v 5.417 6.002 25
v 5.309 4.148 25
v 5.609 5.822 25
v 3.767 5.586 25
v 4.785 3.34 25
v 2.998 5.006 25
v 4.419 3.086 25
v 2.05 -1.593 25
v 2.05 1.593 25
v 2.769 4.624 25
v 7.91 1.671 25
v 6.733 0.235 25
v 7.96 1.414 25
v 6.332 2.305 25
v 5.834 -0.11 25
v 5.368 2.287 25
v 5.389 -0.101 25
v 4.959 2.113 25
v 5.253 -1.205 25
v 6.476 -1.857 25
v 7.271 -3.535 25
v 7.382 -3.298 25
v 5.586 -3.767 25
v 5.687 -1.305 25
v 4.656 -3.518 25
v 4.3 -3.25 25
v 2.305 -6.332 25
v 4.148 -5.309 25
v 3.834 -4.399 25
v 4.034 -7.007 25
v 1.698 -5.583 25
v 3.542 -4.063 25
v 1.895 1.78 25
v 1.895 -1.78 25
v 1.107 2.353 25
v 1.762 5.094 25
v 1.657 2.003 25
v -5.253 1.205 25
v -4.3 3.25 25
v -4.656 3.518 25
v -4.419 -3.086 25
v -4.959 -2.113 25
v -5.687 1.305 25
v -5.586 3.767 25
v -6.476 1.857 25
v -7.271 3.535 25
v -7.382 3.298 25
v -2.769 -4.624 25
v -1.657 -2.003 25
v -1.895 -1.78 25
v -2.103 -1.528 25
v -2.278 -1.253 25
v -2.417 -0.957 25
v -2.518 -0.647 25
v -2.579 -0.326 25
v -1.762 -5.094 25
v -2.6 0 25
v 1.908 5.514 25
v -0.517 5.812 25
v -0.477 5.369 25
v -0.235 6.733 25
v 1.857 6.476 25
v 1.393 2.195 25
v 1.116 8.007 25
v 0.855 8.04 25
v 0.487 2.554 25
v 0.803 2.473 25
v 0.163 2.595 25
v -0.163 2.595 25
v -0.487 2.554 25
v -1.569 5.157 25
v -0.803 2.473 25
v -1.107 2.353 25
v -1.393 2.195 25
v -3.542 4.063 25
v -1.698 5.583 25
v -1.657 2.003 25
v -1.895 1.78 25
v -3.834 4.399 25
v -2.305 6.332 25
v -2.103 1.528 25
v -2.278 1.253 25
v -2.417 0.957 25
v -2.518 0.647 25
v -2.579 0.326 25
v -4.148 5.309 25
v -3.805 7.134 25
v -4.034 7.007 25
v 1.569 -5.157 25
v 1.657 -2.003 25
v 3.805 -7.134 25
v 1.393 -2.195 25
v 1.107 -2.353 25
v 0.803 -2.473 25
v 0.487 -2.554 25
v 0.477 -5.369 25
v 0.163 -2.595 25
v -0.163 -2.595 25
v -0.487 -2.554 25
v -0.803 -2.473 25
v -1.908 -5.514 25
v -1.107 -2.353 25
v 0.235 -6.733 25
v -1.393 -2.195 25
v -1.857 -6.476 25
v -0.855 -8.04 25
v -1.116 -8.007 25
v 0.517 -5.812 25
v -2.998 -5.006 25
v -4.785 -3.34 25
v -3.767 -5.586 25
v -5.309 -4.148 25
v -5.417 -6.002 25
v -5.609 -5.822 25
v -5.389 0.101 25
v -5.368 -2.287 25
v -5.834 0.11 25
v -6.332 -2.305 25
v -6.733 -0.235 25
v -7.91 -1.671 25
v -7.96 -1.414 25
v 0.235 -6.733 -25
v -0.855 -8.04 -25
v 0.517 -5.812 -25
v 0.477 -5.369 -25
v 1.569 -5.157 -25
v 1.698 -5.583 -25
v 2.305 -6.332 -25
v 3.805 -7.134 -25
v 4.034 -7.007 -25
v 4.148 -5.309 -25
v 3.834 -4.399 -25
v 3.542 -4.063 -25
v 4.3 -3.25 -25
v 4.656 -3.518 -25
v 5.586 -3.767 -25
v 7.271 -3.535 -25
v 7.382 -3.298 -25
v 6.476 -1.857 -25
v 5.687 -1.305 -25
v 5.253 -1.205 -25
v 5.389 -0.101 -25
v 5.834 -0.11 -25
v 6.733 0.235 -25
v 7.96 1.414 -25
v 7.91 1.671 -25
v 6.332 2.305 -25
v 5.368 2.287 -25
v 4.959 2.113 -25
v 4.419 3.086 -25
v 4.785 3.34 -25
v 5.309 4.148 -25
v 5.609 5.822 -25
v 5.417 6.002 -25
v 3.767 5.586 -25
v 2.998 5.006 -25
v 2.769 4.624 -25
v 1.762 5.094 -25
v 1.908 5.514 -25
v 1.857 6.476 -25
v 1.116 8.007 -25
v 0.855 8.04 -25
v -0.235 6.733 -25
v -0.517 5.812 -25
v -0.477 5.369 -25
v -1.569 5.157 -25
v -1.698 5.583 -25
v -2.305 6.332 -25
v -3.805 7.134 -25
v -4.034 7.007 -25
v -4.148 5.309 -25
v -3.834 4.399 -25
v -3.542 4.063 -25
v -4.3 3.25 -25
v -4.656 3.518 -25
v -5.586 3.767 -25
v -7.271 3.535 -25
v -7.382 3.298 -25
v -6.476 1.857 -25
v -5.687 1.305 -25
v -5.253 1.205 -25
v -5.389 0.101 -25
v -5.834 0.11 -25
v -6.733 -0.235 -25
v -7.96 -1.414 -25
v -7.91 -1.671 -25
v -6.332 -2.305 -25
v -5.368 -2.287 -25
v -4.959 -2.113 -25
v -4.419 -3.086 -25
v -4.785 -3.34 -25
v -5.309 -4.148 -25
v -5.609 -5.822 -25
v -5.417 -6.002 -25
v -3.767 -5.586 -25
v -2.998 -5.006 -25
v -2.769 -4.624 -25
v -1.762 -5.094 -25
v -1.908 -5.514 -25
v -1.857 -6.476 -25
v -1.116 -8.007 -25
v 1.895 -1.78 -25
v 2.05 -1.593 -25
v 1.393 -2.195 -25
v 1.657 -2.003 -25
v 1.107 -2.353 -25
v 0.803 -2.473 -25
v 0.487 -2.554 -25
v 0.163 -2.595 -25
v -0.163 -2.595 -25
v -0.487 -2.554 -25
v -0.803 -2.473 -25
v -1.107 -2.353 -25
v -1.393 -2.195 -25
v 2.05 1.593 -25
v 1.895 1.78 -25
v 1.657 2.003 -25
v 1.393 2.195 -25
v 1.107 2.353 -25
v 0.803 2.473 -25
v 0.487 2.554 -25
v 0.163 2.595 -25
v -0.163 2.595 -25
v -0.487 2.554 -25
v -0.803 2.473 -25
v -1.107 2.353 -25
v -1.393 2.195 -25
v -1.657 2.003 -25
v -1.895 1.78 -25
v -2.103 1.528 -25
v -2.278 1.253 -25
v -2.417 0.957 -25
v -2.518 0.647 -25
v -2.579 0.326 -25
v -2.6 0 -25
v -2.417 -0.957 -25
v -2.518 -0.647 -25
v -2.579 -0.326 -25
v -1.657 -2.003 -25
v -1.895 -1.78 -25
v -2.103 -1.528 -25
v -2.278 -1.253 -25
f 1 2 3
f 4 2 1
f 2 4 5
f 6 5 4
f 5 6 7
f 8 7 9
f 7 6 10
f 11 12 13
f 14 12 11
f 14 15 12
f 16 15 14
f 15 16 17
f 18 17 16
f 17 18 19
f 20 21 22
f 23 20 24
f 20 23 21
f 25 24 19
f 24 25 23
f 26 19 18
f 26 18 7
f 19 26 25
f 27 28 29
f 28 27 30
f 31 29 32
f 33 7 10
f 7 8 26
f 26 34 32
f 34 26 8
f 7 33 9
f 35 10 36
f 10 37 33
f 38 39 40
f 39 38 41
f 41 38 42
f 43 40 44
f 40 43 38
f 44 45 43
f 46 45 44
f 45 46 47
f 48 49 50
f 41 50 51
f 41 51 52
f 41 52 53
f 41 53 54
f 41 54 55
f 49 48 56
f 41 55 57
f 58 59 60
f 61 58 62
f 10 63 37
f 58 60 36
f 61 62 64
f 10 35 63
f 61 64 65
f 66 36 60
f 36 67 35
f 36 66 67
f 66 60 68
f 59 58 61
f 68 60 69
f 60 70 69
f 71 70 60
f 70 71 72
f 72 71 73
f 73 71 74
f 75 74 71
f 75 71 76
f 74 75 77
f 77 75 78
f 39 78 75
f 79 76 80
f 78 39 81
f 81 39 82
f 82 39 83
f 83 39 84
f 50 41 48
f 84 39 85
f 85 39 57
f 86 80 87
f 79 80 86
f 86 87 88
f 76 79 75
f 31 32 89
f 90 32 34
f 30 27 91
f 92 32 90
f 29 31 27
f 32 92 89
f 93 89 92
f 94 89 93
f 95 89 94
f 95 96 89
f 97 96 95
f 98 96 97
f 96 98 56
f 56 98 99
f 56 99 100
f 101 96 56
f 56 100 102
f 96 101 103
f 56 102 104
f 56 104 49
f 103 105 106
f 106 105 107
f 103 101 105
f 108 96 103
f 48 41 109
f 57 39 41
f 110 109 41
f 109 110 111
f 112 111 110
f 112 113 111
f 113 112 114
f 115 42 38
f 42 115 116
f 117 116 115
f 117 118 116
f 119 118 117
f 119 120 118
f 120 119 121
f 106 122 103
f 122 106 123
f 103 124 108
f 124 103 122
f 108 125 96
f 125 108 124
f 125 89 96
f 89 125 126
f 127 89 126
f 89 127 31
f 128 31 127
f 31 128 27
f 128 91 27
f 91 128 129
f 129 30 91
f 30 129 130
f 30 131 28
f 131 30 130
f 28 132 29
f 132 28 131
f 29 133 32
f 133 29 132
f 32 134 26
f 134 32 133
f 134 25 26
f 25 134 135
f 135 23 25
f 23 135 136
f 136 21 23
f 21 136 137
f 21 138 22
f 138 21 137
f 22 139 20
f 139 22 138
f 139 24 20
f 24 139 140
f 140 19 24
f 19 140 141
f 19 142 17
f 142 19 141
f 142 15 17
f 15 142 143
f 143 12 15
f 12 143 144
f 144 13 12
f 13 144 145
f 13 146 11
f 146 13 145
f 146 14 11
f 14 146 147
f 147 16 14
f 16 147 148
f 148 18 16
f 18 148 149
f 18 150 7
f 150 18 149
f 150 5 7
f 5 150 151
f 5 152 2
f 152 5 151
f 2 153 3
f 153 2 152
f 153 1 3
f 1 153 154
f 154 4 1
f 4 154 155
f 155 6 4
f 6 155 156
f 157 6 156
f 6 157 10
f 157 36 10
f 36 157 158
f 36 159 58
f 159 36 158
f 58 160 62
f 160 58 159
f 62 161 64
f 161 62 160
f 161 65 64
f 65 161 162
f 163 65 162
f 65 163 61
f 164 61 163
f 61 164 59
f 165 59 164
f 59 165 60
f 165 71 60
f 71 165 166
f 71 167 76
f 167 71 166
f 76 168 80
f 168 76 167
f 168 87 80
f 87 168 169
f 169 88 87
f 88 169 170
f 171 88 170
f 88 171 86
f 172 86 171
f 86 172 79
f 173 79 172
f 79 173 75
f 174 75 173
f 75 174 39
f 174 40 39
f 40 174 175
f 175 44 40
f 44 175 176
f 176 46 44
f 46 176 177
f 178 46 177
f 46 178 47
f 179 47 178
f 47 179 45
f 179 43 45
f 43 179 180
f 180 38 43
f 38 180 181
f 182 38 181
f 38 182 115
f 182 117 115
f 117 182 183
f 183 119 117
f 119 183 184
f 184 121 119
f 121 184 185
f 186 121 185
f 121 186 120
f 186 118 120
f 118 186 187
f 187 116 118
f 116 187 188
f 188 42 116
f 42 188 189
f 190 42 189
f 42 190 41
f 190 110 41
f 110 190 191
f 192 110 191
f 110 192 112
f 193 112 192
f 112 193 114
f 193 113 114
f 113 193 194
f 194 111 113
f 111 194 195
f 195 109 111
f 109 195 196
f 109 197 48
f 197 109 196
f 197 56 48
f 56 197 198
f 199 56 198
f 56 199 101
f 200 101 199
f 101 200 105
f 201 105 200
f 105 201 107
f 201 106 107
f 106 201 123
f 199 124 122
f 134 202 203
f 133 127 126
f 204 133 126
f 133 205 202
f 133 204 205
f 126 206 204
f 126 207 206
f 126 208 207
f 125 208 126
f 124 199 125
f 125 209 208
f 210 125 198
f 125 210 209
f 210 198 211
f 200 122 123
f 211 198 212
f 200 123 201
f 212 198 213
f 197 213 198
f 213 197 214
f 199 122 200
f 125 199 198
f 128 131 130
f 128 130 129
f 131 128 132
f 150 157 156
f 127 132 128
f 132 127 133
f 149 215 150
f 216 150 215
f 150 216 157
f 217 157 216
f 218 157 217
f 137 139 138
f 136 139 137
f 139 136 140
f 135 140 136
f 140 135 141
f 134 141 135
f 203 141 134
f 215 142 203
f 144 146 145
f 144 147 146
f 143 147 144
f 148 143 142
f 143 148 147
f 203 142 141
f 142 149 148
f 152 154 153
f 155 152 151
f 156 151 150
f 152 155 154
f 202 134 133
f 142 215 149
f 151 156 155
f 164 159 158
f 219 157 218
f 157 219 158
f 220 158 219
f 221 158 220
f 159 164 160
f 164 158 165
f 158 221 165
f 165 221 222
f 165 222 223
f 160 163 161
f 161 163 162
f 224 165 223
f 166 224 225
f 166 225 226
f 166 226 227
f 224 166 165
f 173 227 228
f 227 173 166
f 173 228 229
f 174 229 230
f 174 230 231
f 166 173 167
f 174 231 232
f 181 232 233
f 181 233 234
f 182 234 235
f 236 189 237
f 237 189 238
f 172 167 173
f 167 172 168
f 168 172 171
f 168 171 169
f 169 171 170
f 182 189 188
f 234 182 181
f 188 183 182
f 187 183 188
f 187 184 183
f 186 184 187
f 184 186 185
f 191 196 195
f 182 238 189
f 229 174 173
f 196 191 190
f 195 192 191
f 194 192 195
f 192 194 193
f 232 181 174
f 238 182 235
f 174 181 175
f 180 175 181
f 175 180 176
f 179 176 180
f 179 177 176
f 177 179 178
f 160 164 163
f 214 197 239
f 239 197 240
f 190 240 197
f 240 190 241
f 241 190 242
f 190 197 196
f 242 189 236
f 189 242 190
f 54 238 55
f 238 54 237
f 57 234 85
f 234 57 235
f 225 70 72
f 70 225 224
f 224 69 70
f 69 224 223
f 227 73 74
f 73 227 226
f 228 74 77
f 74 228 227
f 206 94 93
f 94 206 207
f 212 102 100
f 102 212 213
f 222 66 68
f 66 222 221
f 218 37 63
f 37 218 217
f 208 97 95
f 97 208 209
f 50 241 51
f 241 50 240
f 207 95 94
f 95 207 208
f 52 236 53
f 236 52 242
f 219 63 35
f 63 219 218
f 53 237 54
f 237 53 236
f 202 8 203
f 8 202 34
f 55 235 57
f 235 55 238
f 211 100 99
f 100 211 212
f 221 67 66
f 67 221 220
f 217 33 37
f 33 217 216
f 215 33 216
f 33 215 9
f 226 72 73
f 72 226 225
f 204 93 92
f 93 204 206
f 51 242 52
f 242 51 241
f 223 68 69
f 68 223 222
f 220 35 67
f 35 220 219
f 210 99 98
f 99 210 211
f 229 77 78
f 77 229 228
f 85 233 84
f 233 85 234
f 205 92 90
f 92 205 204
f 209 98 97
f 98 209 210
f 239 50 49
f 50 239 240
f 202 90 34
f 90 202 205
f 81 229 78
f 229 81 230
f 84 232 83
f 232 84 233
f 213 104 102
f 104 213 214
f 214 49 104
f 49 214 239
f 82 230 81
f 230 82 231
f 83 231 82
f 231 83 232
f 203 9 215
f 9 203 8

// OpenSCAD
//globals
$fn=50;
obj_round = 50;
obj_height = 50;
shaft = 5.2;

module master(){
	module rightGear(twist) {
		rotate([0, 0, -25]) {
			translate([0, 0, obj_height/4])
			linear_extrude(height = obj_height/2, center = true, twist = twist, convexity = 10)
			    import (file = "../vectors/small_gear.dxf", layer = "Layer_1");
				circle(r = 1);
		}
	}

module gearObject() {

	module gear() {

		union() {
			rightGear(twist);
			mirror([0,0,1]) rightGear(twist);
		}

	}

	module hole() {	
		cylinder(d=shaft, h=obj_height*2.1, center=true);
	}
	module bone() {
		difference() {
			gear(twist=0);

			hole();
		}
	}
	union() {
		translate([5.6/2, 0, 0]) cube([1.5,5,obj_height], center=true);
		bone();
	}
}
gearObject();
}

intersection(){

master();
}
